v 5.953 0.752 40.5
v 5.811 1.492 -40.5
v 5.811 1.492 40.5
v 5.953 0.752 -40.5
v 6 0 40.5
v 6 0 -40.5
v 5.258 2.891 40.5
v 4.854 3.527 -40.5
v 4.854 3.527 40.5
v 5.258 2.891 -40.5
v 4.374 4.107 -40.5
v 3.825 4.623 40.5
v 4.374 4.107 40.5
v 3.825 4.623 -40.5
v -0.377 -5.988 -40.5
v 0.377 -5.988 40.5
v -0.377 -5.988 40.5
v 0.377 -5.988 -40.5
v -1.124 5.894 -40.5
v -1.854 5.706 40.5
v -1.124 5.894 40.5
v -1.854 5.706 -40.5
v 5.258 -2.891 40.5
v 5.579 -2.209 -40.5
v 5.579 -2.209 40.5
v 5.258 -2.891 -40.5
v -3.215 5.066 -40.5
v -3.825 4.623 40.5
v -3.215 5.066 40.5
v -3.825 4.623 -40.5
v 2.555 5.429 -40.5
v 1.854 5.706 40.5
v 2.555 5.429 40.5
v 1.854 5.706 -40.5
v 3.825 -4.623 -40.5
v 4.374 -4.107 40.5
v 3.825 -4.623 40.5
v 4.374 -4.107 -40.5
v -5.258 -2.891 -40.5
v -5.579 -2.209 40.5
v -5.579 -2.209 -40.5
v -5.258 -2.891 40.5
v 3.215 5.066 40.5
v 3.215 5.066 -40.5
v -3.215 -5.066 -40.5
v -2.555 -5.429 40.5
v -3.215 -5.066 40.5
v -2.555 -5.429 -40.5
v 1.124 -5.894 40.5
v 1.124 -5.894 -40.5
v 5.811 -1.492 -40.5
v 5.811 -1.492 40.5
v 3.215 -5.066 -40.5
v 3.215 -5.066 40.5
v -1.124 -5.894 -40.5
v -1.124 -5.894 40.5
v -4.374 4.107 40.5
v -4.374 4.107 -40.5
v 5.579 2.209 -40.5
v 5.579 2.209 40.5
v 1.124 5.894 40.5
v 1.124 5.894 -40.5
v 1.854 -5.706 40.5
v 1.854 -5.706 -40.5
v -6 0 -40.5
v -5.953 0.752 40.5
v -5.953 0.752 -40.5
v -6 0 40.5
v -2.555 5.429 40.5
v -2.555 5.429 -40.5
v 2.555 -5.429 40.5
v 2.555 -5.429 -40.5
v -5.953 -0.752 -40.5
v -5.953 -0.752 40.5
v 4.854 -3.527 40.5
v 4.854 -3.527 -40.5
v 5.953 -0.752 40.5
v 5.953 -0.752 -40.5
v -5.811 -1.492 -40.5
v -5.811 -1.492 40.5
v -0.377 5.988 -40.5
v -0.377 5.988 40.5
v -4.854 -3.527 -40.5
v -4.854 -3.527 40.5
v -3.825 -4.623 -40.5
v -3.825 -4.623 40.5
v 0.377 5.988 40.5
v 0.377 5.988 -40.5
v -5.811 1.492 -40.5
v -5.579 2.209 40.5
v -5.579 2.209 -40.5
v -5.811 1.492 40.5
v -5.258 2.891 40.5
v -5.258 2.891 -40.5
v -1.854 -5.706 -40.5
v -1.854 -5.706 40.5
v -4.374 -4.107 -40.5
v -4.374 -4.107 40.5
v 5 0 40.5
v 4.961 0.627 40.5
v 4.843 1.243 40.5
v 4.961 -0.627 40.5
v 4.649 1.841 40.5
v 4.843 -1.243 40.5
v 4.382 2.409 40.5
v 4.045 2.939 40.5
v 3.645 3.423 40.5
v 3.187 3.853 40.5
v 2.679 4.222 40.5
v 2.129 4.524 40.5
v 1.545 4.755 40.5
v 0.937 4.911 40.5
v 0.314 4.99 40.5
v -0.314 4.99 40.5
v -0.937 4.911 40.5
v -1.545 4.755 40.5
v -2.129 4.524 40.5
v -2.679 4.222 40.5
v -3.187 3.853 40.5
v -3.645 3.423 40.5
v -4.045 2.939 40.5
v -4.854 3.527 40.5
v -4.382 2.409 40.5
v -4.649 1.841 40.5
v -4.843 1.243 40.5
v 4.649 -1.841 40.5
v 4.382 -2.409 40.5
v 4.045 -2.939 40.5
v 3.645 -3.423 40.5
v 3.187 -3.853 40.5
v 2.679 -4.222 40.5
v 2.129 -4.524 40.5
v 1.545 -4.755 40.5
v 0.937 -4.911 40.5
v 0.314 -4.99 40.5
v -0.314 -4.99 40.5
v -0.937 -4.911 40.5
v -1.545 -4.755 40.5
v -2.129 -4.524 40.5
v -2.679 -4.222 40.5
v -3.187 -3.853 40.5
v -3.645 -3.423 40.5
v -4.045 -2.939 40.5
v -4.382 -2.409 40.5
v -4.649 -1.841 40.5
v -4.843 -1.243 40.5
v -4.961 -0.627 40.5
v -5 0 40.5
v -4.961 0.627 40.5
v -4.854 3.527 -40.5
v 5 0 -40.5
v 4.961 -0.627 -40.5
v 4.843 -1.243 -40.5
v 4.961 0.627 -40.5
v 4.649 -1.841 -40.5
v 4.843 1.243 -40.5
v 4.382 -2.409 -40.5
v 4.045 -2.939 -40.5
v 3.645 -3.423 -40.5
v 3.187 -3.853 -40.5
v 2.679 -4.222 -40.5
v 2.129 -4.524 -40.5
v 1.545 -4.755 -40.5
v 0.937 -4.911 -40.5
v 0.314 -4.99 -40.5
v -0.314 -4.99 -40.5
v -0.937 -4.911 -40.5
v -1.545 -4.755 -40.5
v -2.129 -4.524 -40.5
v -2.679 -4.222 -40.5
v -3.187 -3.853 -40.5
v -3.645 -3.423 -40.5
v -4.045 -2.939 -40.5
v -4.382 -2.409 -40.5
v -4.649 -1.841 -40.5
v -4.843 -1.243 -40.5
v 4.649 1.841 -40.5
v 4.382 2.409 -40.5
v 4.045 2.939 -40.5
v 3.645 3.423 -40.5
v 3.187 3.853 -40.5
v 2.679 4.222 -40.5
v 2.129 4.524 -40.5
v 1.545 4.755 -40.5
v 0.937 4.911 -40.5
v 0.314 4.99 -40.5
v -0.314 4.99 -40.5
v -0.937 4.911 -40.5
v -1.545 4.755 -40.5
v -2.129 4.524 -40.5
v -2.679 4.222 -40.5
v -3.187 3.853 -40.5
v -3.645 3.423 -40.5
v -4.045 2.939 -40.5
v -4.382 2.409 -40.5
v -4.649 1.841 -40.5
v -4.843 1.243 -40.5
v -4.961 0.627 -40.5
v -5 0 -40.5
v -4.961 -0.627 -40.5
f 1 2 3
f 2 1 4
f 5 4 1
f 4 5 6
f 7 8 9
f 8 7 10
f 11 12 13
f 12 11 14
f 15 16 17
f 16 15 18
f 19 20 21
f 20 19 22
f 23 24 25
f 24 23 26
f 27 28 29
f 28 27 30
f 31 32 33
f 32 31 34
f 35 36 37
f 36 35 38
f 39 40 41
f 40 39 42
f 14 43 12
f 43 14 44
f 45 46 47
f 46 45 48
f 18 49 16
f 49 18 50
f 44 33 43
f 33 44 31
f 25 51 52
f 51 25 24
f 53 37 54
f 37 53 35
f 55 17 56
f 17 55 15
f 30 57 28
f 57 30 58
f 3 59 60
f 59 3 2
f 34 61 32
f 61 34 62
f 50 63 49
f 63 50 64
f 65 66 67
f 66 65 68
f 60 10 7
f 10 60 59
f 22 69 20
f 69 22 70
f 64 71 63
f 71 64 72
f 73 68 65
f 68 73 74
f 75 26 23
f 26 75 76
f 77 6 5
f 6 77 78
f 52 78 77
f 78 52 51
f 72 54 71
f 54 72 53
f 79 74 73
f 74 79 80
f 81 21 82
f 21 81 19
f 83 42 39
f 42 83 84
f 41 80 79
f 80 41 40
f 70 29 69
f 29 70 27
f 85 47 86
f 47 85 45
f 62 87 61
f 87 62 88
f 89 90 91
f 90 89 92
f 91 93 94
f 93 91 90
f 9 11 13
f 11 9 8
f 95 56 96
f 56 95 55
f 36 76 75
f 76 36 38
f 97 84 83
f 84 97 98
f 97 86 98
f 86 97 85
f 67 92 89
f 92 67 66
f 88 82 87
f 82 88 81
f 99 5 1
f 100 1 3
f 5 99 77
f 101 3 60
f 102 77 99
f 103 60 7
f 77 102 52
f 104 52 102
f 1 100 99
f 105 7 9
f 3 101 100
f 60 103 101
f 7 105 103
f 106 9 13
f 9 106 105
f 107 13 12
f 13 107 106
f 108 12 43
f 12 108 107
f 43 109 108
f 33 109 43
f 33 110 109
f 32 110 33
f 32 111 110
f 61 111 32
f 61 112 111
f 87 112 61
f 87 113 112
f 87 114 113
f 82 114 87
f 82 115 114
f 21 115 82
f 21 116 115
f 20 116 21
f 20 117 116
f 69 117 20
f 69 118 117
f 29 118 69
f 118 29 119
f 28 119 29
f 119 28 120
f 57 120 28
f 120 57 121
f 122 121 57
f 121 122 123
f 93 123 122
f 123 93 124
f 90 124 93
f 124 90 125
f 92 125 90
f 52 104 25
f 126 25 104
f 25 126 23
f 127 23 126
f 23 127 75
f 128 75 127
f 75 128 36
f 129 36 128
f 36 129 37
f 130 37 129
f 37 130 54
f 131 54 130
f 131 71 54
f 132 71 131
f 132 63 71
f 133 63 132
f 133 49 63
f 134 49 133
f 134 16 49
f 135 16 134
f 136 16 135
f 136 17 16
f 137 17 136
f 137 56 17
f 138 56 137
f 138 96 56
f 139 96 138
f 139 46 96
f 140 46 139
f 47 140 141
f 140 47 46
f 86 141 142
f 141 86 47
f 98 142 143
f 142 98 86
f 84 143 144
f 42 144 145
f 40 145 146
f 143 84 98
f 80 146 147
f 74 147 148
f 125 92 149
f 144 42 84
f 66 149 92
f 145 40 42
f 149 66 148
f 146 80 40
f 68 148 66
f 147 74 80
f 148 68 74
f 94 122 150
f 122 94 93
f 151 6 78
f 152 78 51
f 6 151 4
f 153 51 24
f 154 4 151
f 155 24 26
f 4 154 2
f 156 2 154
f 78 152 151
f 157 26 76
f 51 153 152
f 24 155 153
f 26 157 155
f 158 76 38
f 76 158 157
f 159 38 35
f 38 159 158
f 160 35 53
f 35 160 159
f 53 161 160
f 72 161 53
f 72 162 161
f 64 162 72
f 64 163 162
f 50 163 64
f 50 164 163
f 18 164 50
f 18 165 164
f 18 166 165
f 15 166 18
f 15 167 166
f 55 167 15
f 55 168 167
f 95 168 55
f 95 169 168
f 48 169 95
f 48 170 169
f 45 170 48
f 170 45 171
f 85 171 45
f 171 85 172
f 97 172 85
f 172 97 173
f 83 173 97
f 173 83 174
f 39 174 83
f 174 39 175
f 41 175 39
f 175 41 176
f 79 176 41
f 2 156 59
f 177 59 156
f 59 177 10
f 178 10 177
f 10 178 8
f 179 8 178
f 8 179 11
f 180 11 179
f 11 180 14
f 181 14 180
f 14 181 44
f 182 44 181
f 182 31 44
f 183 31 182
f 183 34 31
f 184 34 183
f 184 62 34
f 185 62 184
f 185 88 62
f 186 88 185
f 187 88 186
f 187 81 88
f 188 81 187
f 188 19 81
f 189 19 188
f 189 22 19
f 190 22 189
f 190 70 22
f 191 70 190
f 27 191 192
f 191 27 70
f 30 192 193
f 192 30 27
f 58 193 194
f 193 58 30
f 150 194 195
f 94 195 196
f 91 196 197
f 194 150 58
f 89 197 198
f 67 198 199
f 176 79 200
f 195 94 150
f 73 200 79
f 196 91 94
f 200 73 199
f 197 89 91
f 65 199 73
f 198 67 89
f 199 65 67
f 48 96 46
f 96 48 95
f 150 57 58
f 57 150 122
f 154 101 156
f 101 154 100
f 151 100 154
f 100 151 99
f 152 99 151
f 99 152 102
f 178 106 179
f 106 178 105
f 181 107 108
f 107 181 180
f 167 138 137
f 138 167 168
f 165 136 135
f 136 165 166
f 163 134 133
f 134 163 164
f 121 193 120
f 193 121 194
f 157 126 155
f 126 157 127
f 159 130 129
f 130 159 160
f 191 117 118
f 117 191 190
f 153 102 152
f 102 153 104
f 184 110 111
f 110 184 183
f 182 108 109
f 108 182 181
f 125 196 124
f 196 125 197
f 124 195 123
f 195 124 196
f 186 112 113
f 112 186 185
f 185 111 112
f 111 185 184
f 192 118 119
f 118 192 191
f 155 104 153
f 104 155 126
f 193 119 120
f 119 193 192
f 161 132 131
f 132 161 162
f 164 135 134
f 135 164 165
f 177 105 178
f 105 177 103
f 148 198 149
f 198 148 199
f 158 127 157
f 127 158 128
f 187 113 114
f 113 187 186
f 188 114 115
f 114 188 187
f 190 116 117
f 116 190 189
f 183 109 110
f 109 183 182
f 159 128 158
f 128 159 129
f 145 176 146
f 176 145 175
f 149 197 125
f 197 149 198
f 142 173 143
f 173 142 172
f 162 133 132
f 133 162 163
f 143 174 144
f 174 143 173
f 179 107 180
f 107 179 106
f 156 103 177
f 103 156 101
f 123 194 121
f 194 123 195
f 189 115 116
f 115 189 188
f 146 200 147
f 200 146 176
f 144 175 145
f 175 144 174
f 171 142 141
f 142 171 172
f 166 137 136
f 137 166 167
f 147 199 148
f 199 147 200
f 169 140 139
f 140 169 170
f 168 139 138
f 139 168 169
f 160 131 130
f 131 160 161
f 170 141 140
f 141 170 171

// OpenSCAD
$fn = 50;


difference() {
	union() {
		translate(v = [0, 0, -40.5000000000]) {
			cylinder(h = 81, r = 6.0000000000);
		}
	}
	union() {
		translate(v = [0, 0, -100.0000000000]) {
			cylinder(h = 200, r = 5.0000000000);
		}
	}
}
